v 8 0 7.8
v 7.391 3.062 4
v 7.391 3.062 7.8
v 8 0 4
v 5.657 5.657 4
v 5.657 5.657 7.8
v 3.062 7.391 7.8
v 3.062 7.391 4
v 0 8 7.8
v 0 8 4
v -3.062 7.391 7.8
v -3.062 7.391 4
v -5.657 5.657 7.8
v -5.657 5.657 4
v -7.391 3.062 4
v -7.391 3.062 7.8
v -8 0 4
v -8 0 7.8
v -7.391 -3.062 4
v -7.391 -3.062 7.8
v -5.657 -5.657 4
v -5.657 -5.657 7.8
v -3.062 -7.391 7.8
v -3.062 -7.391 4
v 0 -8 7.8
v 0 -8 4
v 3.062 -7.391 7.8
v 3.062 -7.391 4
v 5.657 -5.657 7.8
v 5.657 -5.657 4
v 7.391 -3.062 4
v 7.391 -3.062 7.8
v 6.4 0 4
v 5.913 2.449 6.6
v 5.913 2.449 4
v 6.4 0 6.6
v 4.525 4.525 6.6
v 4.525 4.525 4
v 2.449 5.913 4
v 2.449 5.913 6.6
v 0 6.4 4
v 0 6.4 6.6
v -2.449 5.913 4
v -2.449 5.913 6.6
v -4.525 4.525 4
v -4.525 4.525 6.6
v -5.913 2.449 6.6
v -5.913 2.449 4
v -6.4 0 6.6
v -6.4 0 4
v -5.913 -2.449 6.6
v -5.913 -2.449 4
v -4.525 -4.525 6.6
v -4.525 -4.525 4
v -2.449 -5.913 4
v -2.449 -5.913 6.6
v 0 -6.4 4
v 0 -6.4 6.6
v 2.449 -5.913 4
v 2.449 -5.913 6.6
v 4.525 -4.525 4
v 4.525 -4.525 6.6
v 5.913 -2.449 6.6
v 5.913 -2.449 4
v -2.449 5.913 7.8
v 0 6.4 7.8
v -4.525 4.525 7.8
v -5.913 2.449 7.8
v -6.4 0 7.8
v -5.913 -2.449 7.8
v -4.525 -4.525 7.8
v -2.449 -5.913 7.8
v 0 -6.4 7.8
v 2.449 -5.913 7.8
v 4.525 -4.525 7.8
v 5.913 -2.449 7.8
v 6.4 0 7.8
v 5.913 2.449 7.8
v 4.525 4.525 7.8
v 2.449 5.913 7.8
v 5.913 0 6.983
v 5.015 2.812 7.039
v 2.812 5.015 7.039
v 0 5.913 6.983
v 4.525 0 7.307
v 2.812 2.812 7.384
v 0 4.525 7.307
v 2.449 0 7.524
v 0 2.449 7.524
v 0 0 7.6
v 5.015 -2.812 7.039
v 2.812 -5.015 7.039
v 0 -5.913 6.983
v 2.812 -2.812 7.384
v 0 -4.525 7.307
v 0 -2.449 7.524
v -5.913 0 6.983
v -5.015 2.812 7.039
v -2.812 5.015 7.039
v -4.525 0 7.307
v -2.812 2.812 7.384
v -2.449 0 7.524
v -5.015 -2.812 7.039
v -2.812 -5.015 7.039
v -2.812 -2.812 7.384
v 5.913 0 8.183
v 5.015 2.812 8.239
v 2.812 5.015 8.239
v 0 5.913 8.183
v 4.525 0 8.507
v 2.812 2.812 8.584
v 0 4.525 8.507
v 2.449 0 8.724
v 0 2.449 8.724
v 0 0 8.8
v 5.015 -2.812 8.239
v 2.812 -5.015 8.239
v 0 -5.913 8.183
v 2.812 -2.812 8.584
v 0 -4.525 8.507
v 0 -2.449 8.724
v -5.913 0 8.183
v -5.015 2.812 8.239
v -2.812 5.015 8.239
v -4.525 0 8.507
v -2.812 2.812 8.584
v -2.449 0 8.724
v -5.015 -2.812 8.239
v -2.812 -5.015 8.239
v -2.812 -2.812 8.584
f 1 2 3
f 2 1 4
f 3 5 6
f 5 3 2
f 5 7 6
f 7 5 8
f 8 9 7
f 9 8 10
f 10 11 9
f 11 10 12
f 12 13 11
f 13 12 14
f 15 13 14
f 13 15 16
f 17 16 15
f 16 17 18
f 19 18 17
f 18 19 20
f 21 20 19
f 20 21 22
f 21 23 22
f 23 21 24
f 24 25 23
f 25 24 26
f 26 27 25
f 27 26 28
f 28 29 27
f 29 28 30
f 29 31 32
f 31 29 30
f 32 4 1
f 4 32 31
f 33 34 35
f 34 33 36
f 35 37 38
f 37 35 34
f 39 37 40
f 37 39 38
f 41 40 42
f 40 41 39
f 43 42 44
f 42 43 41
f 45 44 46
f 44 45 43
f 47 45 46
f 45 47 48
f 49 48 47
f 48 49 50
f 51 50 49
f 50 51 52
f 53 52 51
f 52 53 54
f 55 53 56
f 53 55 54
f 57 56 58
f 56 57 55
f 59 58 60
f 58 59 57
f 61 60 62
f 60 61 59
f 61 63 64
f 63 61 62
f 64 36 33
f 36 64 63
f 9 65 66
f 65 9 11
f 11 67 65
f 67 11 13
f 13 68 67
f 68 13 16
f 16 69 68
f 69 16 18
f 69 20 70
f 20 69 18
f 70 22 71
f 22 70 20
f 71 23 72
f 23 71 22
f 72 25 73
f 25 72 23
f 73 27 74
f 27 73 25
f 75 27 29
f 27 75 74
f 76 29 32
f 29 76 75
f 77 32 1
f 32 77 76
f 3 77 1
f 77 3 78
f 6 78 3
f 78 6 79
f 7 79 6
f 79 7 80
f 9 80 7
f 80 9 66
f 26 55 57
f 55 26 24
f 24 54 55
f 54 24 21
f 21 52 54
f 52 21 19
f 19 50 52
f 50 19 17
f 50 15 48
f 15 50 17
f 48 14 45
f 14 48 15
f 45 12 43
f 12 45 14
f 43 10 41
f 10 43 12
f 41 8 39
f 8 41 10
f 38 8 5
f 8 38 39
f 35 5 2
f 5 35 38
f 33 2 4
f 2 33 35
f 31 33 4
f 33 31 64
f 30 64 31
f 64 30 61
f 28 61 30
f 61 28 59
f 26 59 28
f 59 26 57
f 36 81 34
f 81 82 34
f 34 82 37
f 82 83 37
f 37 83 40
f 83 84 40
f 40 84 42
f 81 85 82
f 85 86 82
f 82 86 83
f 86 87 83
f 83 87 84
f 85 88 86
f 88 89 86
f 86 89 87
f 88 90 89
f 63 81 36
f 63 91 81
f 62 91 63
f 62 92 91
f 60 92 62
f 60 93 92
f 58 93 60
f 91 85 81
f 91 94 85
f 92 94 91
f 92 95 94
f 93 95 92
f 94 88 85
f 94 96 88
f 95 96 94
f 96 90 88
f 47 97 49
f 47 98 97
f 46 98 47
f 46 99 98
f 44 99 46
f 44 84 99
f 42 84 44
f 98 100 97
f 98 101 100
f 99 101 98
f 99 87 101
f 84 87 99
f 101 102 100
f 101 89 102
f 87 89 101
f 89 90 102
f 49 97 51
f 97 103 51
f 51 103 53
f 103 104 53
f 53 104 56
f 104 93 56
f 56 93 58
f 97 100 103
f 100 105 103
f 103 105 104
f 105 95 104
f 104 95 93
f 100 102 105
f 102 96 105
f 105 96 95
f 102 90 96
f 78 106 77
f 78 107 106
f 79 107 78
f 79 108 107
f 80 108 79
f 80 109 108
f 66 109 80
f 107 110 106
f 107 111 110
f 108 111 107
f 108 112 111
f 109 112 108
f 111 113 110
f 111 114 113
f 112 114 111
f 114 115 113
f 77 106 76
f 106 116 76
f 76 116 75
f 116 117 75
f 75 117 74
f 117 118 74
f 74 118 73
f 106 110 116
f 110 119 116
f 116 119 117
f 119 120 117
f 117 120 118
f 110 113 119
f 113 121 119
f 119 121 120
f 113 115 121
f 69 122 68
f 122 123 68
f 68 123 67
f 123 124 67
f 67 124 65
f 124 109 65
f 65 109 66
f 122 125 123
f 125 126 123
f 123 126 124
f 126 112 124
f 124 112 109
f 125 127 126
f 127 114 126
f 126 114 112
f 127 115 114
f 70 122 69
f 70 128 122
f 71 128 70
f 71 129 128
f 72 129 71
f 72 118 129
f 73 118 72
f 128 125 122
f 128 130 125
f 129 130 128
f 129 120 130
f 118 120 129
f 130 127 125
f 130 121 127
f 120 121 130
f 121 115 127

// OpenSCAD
// file: ../p/1-8sphe.scad
use <../lib.scad>
function ldraw_lib__1_8sphe() = [
// 0 Sphere 0.125
// 0 Name: 1-8sphe.dat
// 0 Author: James Jessiman
// 0 !LDRAW_ORG Primitive UPDATE 2012-03
// 0 !LICENSE Licensed under CC BY 2.0 and CC BY 4.0 : see CAreadme.txt
// 
// 0 BFC CERTIFY CCW
  [0,"BFC","CERTIFY"],
  [0,"BFC","CCW"],
// 
// 0 !HISTORY 2000-08-01 {Axel Poque} fixes to resolve L3P error messages.
// 0 !HISTORY 2000-08-01 {Manfred Moolhuysen} fixes to resolve L3P error messages.
// 0 !HISTORY 2000-09-30 [PTadmin] Official Update 2000-02
// 0 !HISTORY 2002-03-28 [hafhead] Made BFC compliant
// 0 !HISTORY 2002-04-25 [PTadmin] Official Update 2002-02
// 0 !HISTORY 2007-06-22 [PTadmin] Header formatted for Contributor Agreement
// 0 !HISTORY 2008-07-01 [PTadmin] Official Update 2008-01
// 0 !HISTORY 2010-09-12 [MagFors] Changed winding, removed duplicated cond-line, optimized filesize
// 0 !HISTORY 2010-12-31 [PTadmin] Official Update 2010-03
// 0 !HISTORY 2012-07-01 [tcobbs] Replaced with geometry from LDView
// 0 !HISTORY 2012-12-28 [PTadmin] Official Update 2012-03
// 
// 
// 3 16 1 0 0 0.9239 0.3827 0 0.9239 0 0.3827
  [3,16,1,0,0,0.9239,0.3827,0,0.9239,0,0.3827],
// 3 16 0.9239 0.3827 0 0.7836 0.4393 0.4393 0.9239 0 0.3827
  [3,16,0.9239,0.3827,0,0.7836,0.4393,0.4393,0.9239,0,0.3827],
// 3 16 0.9239 0 0.3827 0.7836 0.4393 0.4393 0.7071 0 0.7071
  [3,16,0.9239,0,0.3827,0.7836,0.4393,0.4393,0.7071,0,0.7071],
// 3 16 0.7836 0.4393 0.4393 0.4393 0.4393 0.7836 0.7071 0 0.7071
  [3,16,0.7836,0.4393,0.4393,0.4393,0.4393,0.7836,0.7071,0,0.7071],
// 3 16 0.7071 0 0.7071 0.4393 0.4393 0.7836 0.3827 0 0.9239
  [3,16,0.7071,0,0.7071,0.4393,0.4393,0.7836,0.3827,0,0.9239],
// 3 16 0.4393 0.4393 0.7836 0 0.3827 0.9239 0.3827 0 0.9239
  [3,16,0.4393,0.4393,0.7836,0,0.3827,0.9239,0.3827,0,0.9239],
// 3 16 0.3827 0 0.9239 0 0.3827 0.9239 0 0 1
  [3,16,0.3827,0,0.9239,0,0.3827,0.9239,0,0,1],
// 3 16 0.9239 0.3827 0 0.7071 0.7071 0 0.7836 0.4393 0.4393
  [3,16,0.9239,0.3827,0,0.7071,0.7071,0,0.7836,0.4393,0.4393],
// 3 16 0.7071 0.7071 0 0.4393 0.7836 0.4393 0.7836 0.4393 0.4393
  [3,16,0.7071,0.7071,0,0.4393,0.7836,0.4393,0.7836,0.4393,0.4393],
// 3 16 0.7836 0.4393 0.4393 0.4393 0.7836 0.4393 0.4393 0.4393 0.7836
  [3,16,0.7836,0.4393,0.4393,0.4393,0.7836,0.4393,0.4393,0.4393,0.7836],
// 3 16 0.4393 0.7836 0.4393 0 0.7071 0.7071 0.4393 0.4393 0.7836
  [3,16,0.4393,0.7836,0.4393,0,0.7071,0.7071,0.4393,0.4393,0.7836],
// 3 16 0.4393 0.4393 0.7836 0 0.7071 0.7071 0 0.3827 0.9239
  [3,16,0.4393,0.4393,0.7836,0,0.7071,0.7071,0,0.3827,0.9239],
// 3 16 0.7071 0.7071 0 0.3827 0.9239 0 0.4393 0.7836 0.4393
  [3,16,0.7071,0.7071,0,0.3827,0.9239,0,0.4393,0.7836,0.4393],
// 3 16 0.3827 0.9239 0 0 0.9239 0.3827 0.4393 0.7836 0.4393
  [3,16,0.3827,0.9239,0,0,0.9239,0.3827,0.4393,0.7836,0.4393],
// 3 16 0.4393 0.7836 0.4393 0 0.9239 0.3827 0 0.7071 0.7071
  [3,16,0.4393,0.7836,0.4393,0,0.9239,0.3827,0,0.7071,0.7071],
// 3 16 0.3827 0.9239 0 0 1 0 0 0.9239 0.3827
  [3,16,0.3827,0.9239,0,0,1,0,0,0.9239,0.3827],
// 
// 5 24 1 0 0 0.9239 0.3827 0 1 0 -0.1 0.9239 0 0.3827
  [5,24,1,0,0,0.9239,0.3827,0,1,0,-0.1,0.9239,0,0.3827],
// 5 24 0.9239 0.3827 0 0.9239 0 0.3827 1 0 0 0.7836 0.4393 0.4393
  [5,24,0.9239,0.3827,0,0.9239,0,0.3827,1,0,0,0.7836,0.4393,0.4393],
// 5 24 1 0 0 0.9239 0 0.3827 0.9239 0.3827 0 1 -0.1 0
  [5,24,1,0,0,0.9239,0,0.3827,0.9239,0.3827,0,1,-0.1,0],
// 5 24 0.9239 0 0.3827 0.7836 0.4393 0.4393 0.9239 0.3827 0 0.7071 0 0.7071
  [5,24,0.9239,0,0.3827,0.7836,0.4393,0.4393,0.9239,0.3827,0,0.7071,0,0.7071],
// 5 24 0.7836 0.4393 0.4393 0.7071 0 0.7071 0.9239 0 0.3827 0.4393 0.4393 0.7836
  [5,24,0.7836,0.4393,0.4393,0.7071,0,0.7071,0.9239,0,0.3827,0.4393,0.4393,0.7836],
// 5 24 0.9239 0 0.3827 0.7071 0 0.7071 0.7836 0.4393 0.4393 0.9239 -0.1 0.3827
  [5,24,0.9239,0,0.3827,0.7071,0,0.7071,0.7836,0.4393,0.4393,0.9239,-0.1,0.3827],
// 5 24 0.7071 0 0.7071 0.4393 0.4393 0.7836 0.7836 0.4393 0.4393 0.3827 0 0.9239
  [5,24,0.7071,0,0.7071,0.4393,0.4393,0.7836,0.7836,0.4393,0.4393,0.3827,0,0.9239],
// 5 24 0.4393 0.4393 0.7836 0.3827 0 0.9239 0.7071 0 0.7071 0 0.3827 0.9239
  [5,24,0.4393,0.4393,0.7836,0.3827,0,0.9239,0.7071,0,0.7071,0,0.3827,0.9239],
// 5 24 0.7071 0 0.7071 0.3827 0 0.9239 0.4393 0.4393 0.7836 0.7071 -0.1 0.7071
  [5,24,0.7071,0,0.7071,0.3827,0,0.9239,0.4393,0.4393,0.7836,0.7071,-0.1,0.7071],
// 5 24 0.3827 0 0.9239 0 0.3827 0.9239 0.4393 0.4393 0.7836 0 0 1
  [5,24,0.3827,0,0.9239,0,0.3827,0.9239,0.4393,0.4393,0.7836,0,0,1],
// 5 24 0 0.3827 0.9239 0 0 1 0.3827 0 0.9239 -0.1 0.3827 0.9239
  [5,24,0,0.3827,0.9239,0,0,1,0.3827,0,0.9239,-0.1,0.3827,0.9239],
// 5 24 0.3827 0 0.9239 0 0 1 0 0.3827 0.9239 0.3827 -0.1 0.9239
  [5,24,0.3827,0,0.9239,0,0,1,0,0.3827,0.9239,0.3827,-0.1,0.9239],
// 5 24 0.9239 0.3827 0 0.7071 0.7071 0 0.9239 0.3827 -0.1 0.7836 0.4393 0.4393
  [5,24,0.9239,0.3827,0,0.7071,0.7071,0,0.9239,0.3827,-0.1,0.7836,0.4393,0.4393],
// 5 24 0.7071 0.7071 0 0.7836 0.4393 0.4393 0.9239 0.3827 0 0.4393 0.7836 0.4393
  [5,24,0.7071,0.7071,0,0.7836,0.4393,0.4393,0.9239,0.3827,0,0.4393,0.7836,0.4393],
// 5 24 0.9239 0.3827 0 0.7836 0.4393 0.4393 0.7071 0.7071 0 0.9239 0 0.3827
  [5,24,0.9239,0.3827,0,0.7836,0.4393,0.4393,0.7071,0.7071,0,0.9239,0,0.3827],
// 5 24 0.7836 0.4393 0.4393 0.4393 0.7836 0.4393 0.7071 0.7071 0 0.4393 0.4393 0.7836
  [5,24,0.7836,0.4393,0.4393,0.4393,0.7836,0.4393,0.7071,0.7071,0,0.4393,0.4393,0.7836],
// 5 24 0.4393 0.7836 0.4393 0.4393 0.4393 0.7836 0.7836 0.4393 0.4393 0 0.7071 0.7071
  [5,24,0.4393,0.7836,0.4393,0.4393,0.4393,0.7836,0.7836,0.4393,0.4393,0,0.7071,0.7071],
// 5 24 0.7836 0.4393 0.4393 0.4393 0.4393 0.7836 0.4393 0.7836 0.4393 0.7071 0 0.7071
  [5,24,0.7836,0.4393,0.4393,0.4393,0.4393,0.7836,0.4393,0.7836,0.4393,0.7071,0,0.7071],
// 5 24 0.4393 0.4393 0.7836 0 0.7071 0.7071 0.4393 0.7836 0.4393 0 0.3827 0.9239
  [5,24,0.4393,0.4393,0.7836,0,0.7071,0.7071,0.4393,0.7836,0.4393,0,0.3827,0.9239],
// 5 24 0 0.7071 0.7071 0 0.3827 0.9239 0.4393 0.4393 0.7836 -0.1 0.7071 0.7071
  [5,24,0,0.7071,0.7071,0,0.3827,0.9239,0.4393,0.4393,0.7836,-0.1,0.7071,0.7071],
// 5 24 0.4393 0.4393 0.7836 0 0.3827 0.9239 0 0.7071 0.7071 0.3827 0 0.9239
  [5,24,0.4393,0.4393,0.7836,0,0.3827,0.9239,0,0.7071,0.7071,0.3827,0,0.9239],
// 5 24 0.7071 0.7071 0 0.3827 0.9239 0 0.7071 0.7071 -0.1 0.4393 0.7836 0.4393
  [5,24,0.7071,0.7071,0,0.3827,0.9239,0,0.7071,0.7071,-0.1,0.4393,0.7836,0.4393],
// 5 24 0.3827 0.9239 0 0.4393 0.7836 0.4393 0.7071 0.7071 0 0 0.9239 0.3827
  [5,24,0.3827,0.9239,0,0.4393,0.7836,0.4393,0.7071,0.7071,0,0,0.9239,0.3827],
// 5 24 0.7071 0.7071 0 0.4393 0.7836 0.4393 0.3827 0.9239 0 0.7836 0.4393 0.4393
  [5,24,0.7071,0.7071,0,0.4393,0.7836,0.4393,0.3827,0.9239,0,0.7836,0.4393,0.4393],
// 5 24 0.4393 0.7836 0.4393 0 0.9239 0.3827 0.3827 0.9239 0 0 0.7071 0.7071
  [5,24,0.4393,0.7836,0.4393,0,0.9239,0.3827,0.3827,0.9239,0,0,0.7071,0.7071],
// 5 24 0 0.9239 0.3827 0 0.7071 0.7071 0.4393 0.7836 0.4393 -0.1 0.9239 0.3827
  [5,24,0,0.9239,0.3827,0,0.7071,0.7071,0.4393,0.7836,0.4393,-0.1,0.9239,0.3827],
// 5 24 0.4393 0.7836 0.4393 0 0.7071 0.7071 0 0.9239 0.3827 0.4393 0.4393 0.7836
  [5,24,0.4393,0.7836,0.4393,0,0.7071,0.7071,0,0.9239,0.3827,0.4393,0.4393,0.7836],
// 5 24 0.3827 0.9239 0 0 1 0 0.3827 0.9239 -0.1 0 0.9239 0.3827
  [5,24,0.3827,0.9239,0,0,1,0,0.3827,0.9239,-0.1,0,0.9239,0.3827],
// 5 24 0 1 0 0 0.9239 0.3827 0.3827 0.9239 0 -0.1 1 0
  [5,24,0,1,0,0,0.9239,0.3827,0.3827,0.9239,0,-0.1,1,0],
// 5 24 0.3827 0.9239 0 0 0.9239 0.3827 0 1 0 0.4393 0.7836 0.4393
  [5,24,0.3827,0.9239,0,0,0.9239,0.3827,0,1,0,0.4393,0.7836,0.4393],
];
module ldraw_lib__1_8sphe(step=0, col=false, unit=2/5, alt=false, line=0.2, solid=!$preview)
    makepoly(ldraw_lib__1_8sphe(), step=step, col=col, unit=unit, alt=alt, line=line, solid=solid);
ldraw_lib__1_8sphe(line=0.2);
// file: ../p/4-4cyli.scad
use <../lib.scad>
function ldraw_lib__4_4cyli() = [
// 0 Cylinder 1.0
// 0 Name: 4-4cyli.dat
// 0 Author: James Jessiman
// 0 !LDRAW_ORG Primitive UPDATE 2005-01
// 0 !LICENSE Licensed under CC BY 2.0 and CC BY 4.0 : see CAreadme.txt
// 
// 0 BFC CERTIFY CCW
  [0,"BFC","CERTIFY"],
  [0,"BFC","CCW"],
// 
// 0 !HISTORY 1998-12-15 [PTadmin] Official Update 1998-10
// 0 !HISTORY 2002-03-23 [sbliss] Added BFC statement; merged headers from files in distributions LDraw 0.27 and Complete.
// 0 !HISTORY 2002-04-25 [PTadmin] Official Update 2002-02
// 0 !HISTORY 2004-12-14 [guyvivan] BFC CCW
// 0 !HISTORY 2005-12-28 [PTadmin] Official Update 2005-01
// 0 !HISTORY 2007-06-24 [PTadmin] Header formatted for Contributor Agreement
// 0 !HISTORY 2008-07-01 [PTadmin] Official Update 2008-01
// 
// 
// 4 16 1 1 0 0.9239 1 0.3827 0.9239 0 0.3827 1 0 0
  [4,16,1,1,0,0.9239,1,0.3827,0.9239,0,0.3827,1,0,0],
// 5 24 1 0 0 1 1 0 0.9239 0 0.3827 0.9239 0 -0.3827
  [5,24,1,0,0,1,1,0,0.9239,0,0.3827,0.9239,0,-0.3827],
// 4 16 0.9239 1 0.3827 0.7071 1 0.7071 0.7071 0 0.7071 0.9239 0 0.3827
  [4,16,0.9239,1,0.3827,0.7071,1,0.7071,0.7071,0,0.7071,0.9239,0,0.3827],
// 5 24 0.9239 0 0.3827 0.9239 1 0.3827 0.7071 0 0.7071 1 0 0
  [5,24,0.9239,0,0.3827,0.9239,1,0.3827,0.7071,0,0.7071,1,0,0],
// 4 16 0.7071 1 0.7071 0.3827 1 0.9239 0.3827 0 0.9239 0.7071 0 0.7071
  [4,16,0.7071,1,0.7071,0.3827,1,0.9239,0.3827,0,0.9239,0.7071,0,0.7071],
// 5 24 0.7071 0 0.7071 0.7071 1 0.7071 0.3827 0 0.9239 0.9239 0 0.3827
  [5,24,0.7071,0,0.7071,0.7071,1,0.7071,0.3827,0,0.9239,0.9239,0,0.3827],
// 4 16 0.3827 1 0.9239 0 1 1 0 0 1 0.3827 0 0.9239
  [4,16,0.3827,1,0.9239,0,1,1,0,0,1,0.3827,0,0.9239],
// 5 24 0.3827 0 0.9239 0.3827 1 0.9239 0 0 1 0.7071 0 0.7071
  [5,24,0.3827,0,0.9239,0.3827,1,0.9239,0,0,1,0.7071,0,0.7071],
// 4 16 0 1 1 -0.3827 1 0.9239 -0.3827 0 0.9239 0 0 1
  [4,16,0,1,1,-0.3827,1,0.9239,-0.3827,0,0.9239,0,0,1],
// 5 24 0 0 1 0 1 1 -0.3827 0 0.9239 0.3827 0 0.9239
  [5,24,0,0,1,0,1,1,-0.3827,0,0.9239,0.3827,0,0.9239],
// 4 16 -0.3827 1 0.9239 -0.7071 1 0.7071 -0.7071 0 0.7071 -0.3827 0 0.9239
  [4,16,-0.3827,1,0.9239,-0.7071,1,0.7071,-0.7071,0,0.7071,-0.3827,0,0.9239],
// 5 24 -0.3827 0 0.9239 -0.3827 1 0.9239 -0.7071 0 0.7071 0 0 1
  [5,24,-0.3827,0,0.9239,-0.3827,1,0.9239,-0.7071,0,0.7071,0,0,1],
// 4 16 -0.7071 1 0.7071 -0.9239 1 0.3827 -0.9239 0 0.3827 -0.7071 0 0.7071
  [4,16,-0.7071,1,0.7071,-0.9239,1,0.3827,-0.9239,0,0.3827,-0.7071,0,0.7071],
// 5 24 -0.7071 0 0.7071 -0.7071 1 0.7071 -0.9239 0 0.3827 -0.3827 0 0.9239
  [5,24,-0.7071,0,0.7071,-0.7071,1,0.7071,-0.9239,0,0.3827,-0.3827,0,0.9239],
// 4 16 -0.9239 1 0.3827 -1 1 0 -1 0 0 -0.9239 0 0.3827
  [4,16,-0.9239,1,0.3827,-1,1,0,-1,0,0,-0.9239,0,0.3827],
// 5 24 -0.9239 0 0.3827 -0.9239 1 0.3827 -1 0 0 -0.7071 0 0.7071
  [5,24,-0.9239,0,0.3827,-0.9239,1,0.3827,-1,0,0,-0.7071,0,0.7071],
// 4 16 -1 1 0 -0.9239 1 -0.3827 -0.9239 0 -0.3827 -1 0 0
  [4,16,-1,1,0,-0.9239,1,-0.3827,-0.9239,0,-0.3827,-1,0,0],
// 5 24 -1 0 0 -1 1 0 -0.9239 0 -0.3827 -0.9239 0 0.3827
  [5,24,-1,0,0,-1,1,0,-0.9239,0,-0.3827,-0.9239,0,0.3827],
// 4 16 -0.9239 1 -0.3827 -0.7071 1 -0.7071 -0.7071 0 -0.7071 -0.9239 0 -0.3827
  [4,16,-0.9239,1,-0.3827,-0.7071,1,-0.7071,-0.7071,0,-0.7071,-0.9239,0,-0.3827],
// 5 24 -0.9239 0 -0.3827 -0.9239 1 -0.3827 -0.7071 0 -0.7071 -1 0 0
  [5,24,-0.9239,0,-0.3827,-0.9239,1,-0.3827,-0.7071,0,-0.7071,-1,0,0],
// 4 16 -0.7071 1 -0.7071 -0.3827 1 -0.9239 -0.3827 0 -0.9239 -0.7071 0 -0.7071
  [4,16,-0.7071,1,-0.7071,-0.3827,1,-0.9239,-0.3827,0,-0.9239,-0.7071,0,-0.7071],
// 5 24 -0.7071 0 -0.7071 -0.7071 1 -0.7071 -0.3827 0 -0.9239 -0.9239 0 -0.3827
  [5,24,-0.7071,0,-0.7071,-0.7071,1,-0.7071,-0.3827,0,-0.9239,-0.9239,0,-0.3827],
// 4 16 -0.3827 1 -0.9239 0 1 -1 0 0 -1 -0.3827 0 -0.9239
  [4,16,-0.3827,1,-0.9239,0,1,-1,0,0,-1,-0.3827,0,-0.9239],
// 5 24 -0.3827 0 -0.9239 -0.3827 1 -0.9239 0 0 -1 -0.7071 0 -0.7071
  [5,24,-0.3827,0,-0.9239,-0.3827,1,-0.9239,0,0,-1,-0.7071,0,-0.7071],
// 4 16 0 1 -1 0.3827 1 -0.9239 0.3827 0 -0.9239 0 0 -1
  [4,16,0,1,-1,0.3827,1,-0.9239,0.3827,0,-0.9239,0,0,-1],
// 5 24 0 0 -1 0 1 -1 0.3827 0 -0.9239 -0.3827 0 -0.9239
  [5,24,0,0,-1,0,1,-1,0.3827,0,-0.9239,-0.3827,0,-0.9239],
// 4 16 0.3827 1 -0.9239 0.7071 1 -0.7071 0.7071 0 -0.7071 0.3827 0 -0.9239
  [4,16,0.3827,1,-0.9239,0.7071,1,-0.7071,0.7071,0,-0.7071,0.3827,0,-0.9239],
// 5 24 0.3827 0 -0.9239 0.3827 1 -0.9239 0.7071 0 -0.7071 0 0 -1
  [5,24,0.3827,0,-0.9239,0.3827,1,-0.9239,0.7071,0,-0.7071,0,0,-1],
// 4 16 0.7071 1 -0.7071 0.9239 1 -0.3827 0.9239 0 -0.3827 0.7071 0 -0.7071
  [4,16,0.7071,1,-0.7071,0.9239,1,-0.3827,0.9239,0,-0.3827,0.7071,0,-0.7071],
// 5 24 0.7071 0 -0.7071 0.7071 1 -0.7071 0.9239 0 -0.3827 0.3827 0 -0.9239
  [5,24,0.7071,0,-0.7071,0.7071,1,-0.7071,0.9239,0,-0.3827,0.3827,0,-0.9239],
// 4 16 0.9239 1 -0.3827 1 1 0 1 0 0 0.9239 0 -0.3827
  [4,16,0.9239,1,-0.3827,1,1,0,1,0,0,0.9239,0,-0.3827],
// 5 24 0.9239 0 -0.3827 0.9239 1 -0.3827 1 0 0 0.7071 0 -0.7071
  [5,24,0.9239,0,-0.3827,0.9239,1,-0.3827,1,0,0,0.7071,0,-0.7071],
// 0
];
module ldraw_lib__4_4cyli(step=0, col=false, unit=2/5, alt=false, line=0.2, solid=!$preview)
    makepoly(ldraw_lib__4_4cyli(), step=step, col=col, unit=unit, alt=alt, line=line, solid=solid);
ldraw_lib__4_4cyli(line=0.2);
// file: ../p/4-8sphe.scad
use <../lib.scad>
use <1-8sphe.scad>
function ldraw_lib__4_8sphe() = [
// 0 Sphere 0.5
// 0 Name: 4-8sphe.dat
// 0 Author: James Jessiman
// 0 !LDRAW_ORG Primitive UPDATE 2003-02
// 0 !LICENSE Licensed under CC BY 2.0 and CC BY 4.0 : see CAreadme.txt
// 
// 0 BFC CERTIFY CCW
  [0,"BFC","CERTIFY"],
  [0,"BFC","CCW"],
// 
// 0 !HISTORY 2002-08-31 [izanette] Modified with WINDZ for BFC compliance
// 0 !HISTORY 2003-08-01 [PTadmin] Official Update 2003-02
// 0 !HISTORY 2007-06-24 [PTadmin] Header formatted for Contributor Agreement
// 0 !HISTORY 2008-07-01 [PTadmin] Official Update 2008-01
// 
// 
// 1 16 0 0 0 1 0 0 0 1 0 0 0 1 1-8sphe.dat
  [1,16,0,0,0,1,0,0,0,1,0,0,0,1, ldraw_lib__1_8sphe()],
// 1 16 0 0 0 1 0 0 0 1 0 0 0 -1 1-8sphe.dat
  [1,16,0,0,0,1,0,0,0,1,0,0,0,-1, ldraw_lib__1_8sphe()],
// 1 16 0 0 0 -1 0 0 0 1 0 0 0 1 1-8sphe.dat
  [1,16,0,0,0,-1,0,0,0,1,0,0,0,1, ldraw_lib__1_8sphe()],
// 1 16 0 0 0 -1 0 0 0 1 0 0 0 -1 1-8sphe.dat
  [1,16,0,0,0,-1,0,0,0,1,0,0,0,-1, ldraw_lib__1_8sphe()],
// 0
// 
];
module ldraw_lib__4_8sphe(step=0, col=false, unit=2/5, alt=false, line=0.2, solid=!$preview)
    makepoly(ldraw_lib__4_8sphe(), step=step, col=col, unit=unit, alt=alt, line=line, solid=solid);
ldraw_lib__4_8sphe(line=0.2);
// file: ../p/4-4ring4.scad
use <../lib.scad>
function ldraw_lib__4_4ring4() = [
// 0 Ring  4 x 1.0
// 0 Name: 4-4ring4.dat
// 0 Author: James Jessiman
// 0 !LDRAW_ORG Primitive UPDATE 2009-01
// 0 !LICENSE Licensed under CC BY 2.0 and CC BY 4.0 : see CAreadme.txt
// 
// 0 BFC CERTIFY CCW
  [0,"BFC","CERTIFY"],
  [0,"BFC","CCW"],
// 
// 0 !HISTORY 1998-12-15 [PTadmin] Official Update 1998-10
// 0 !HISTORY 2002-04-08 [BrickCaster] Modified for BFC compliance
// 0 !HISTORY 2002-04-25 [PTadmin] Official Update 2002-02
// 0 !HISTORY 2007-06-24 [PTadmin] Header formatted for Contributor Agreement
// 0 !HISTORY 2008-07-01 [PTadmin] Official Update 2008-01
// 0 !HISTORY 2008-08-26 [cwdee] Switch polygon winding and rename
// 0 !HISTORY 2009-05-02 [PTadmin] Official Update 2009-01
// 
// 
// 4 16 -1.9135 0 4.6195 -1.5308 0 3.6956 0 0 4 0 0 5
  [4,16,-1.9135,0,4.6195,-1.5308,0,3.6956,0,0,4,0,0,5],
// 4 16 -3.5355 0 3.5355 -2.8284 0 2.8284 -1.5308 0 3.6956 -1.9135 0 4.6195
  [4,16,-3.5355,0,3.5355,-2.8284,0,2.8284,-1.5308,0,3.6956,-1.9135,0,4.6195],
// 4 16 -4.6195 0 1.9135 -3.6956 0 1.5308 -2.8284 0 2.8284 -3.5355 0 3.5355
  [4,16,-4.6195,0,1.9135,-3.6956,0,1.5308,-2.8284,0,2.8284,-3.5355,0,3.5355],
// 4 16 -5 0 0 -4 0 0 -3.6956 0 1.5308 -4.6195 0 1.9135
  [4,16,-5,0,0,-4,0,0,-3.6956,0,1.5308,-4.6195,0,1.9135],
// 4 16 -4.6195 0 -1.9135 -3.6956 0 -1.5308 -4 0 0 -5 0 0
  [4,16,-4.6195,0,-1.9135,-3.6956,0,-1.5308,-4,0,0,-5,0,0],
// 4 16 -3.5355 0 -3.5355 -2.8284 0 -2.8284 -3.6956 0 -1.5308 -4.6195 0 -1.9135
  [4,16,-3.5355,0,-3.5355,-2.8284,0,-2.8284,-3.6956,0,-1.5308,-4.6195,0,-1.9135],
// 4 16 -1.9135 0 -4.6195 -1.5308 0 -3.6956 -2.8284 0 -2.8284 -3.5355 0 -3.5355
  [4,16,-1.9135,0,-4.6195,-1.5308,0,-3.6956,-2.8284,0,-2.8284,-3.5355,0,-3.5355],
// 4 16 0 0 -5 0 0 -4 -1.5308 0 -3.6956 -1.9135 0 -4.6195
  [4,16,0,0,-5,0,0,-4,-1.5308,0,-3.6956,-1.9135,0,-4.6195],
// 4 16 1.9135 0 -4.6195 1.5308 0 -3.6956 0 0 -4 0 0 -5
  [4,16,1.9135,0,-4.6195,1.5308,0,-3.6956,0,0,-4,0,0,-5],
// 4 16 3.5355 0 -3.5355 2.8284 0 -2.8284 1.5308 0 -3.6956 1.9135 0 -4.6195
  [4,16,3.5355,0,-3.5355,2.8284,0,-2.8284,1.5308,0,-3.6956,1.9135,0,-4.6195],
// 4 16 4.6195 0 -1.9135 3.6956 0 -1.5308 2.8284 0 -2.8284 3.5355 0 -3.5355
  [4,16,4.6195,0,-1.9135,3.6956,0,-1.5308,2.8284,0,-2.8284,3.5355,0,-3.5355],
// 4 16 5 0 0 4 0 0 3.6956 0 -1.5308 4.6195 0 -1.9135
  [4,16,5,0,0,4,0,0,3.6956,0,-1.5308,4.6195,0,-1.9135],
// 4 16 4.6195 0 1.9135 3.6956 0 1.5308 4 0 0 5 0 0
  [4,16,4.6195,0,1.9135,3.6956,0,1.5308,4,0,0,5,0,0],
// 4 16 3.5355 0 3.5355 2.8284 0 2.8284 3.6956 0 1.5308 4.6195 0 1.9135
  [4,16,3.5355,0,3.5355,2.8284,0,2.8284,3.6956,0,1.5308,4.6195,0,1.9135],
// 4 16 1.9135 0 4.6195 1.5308 0 3.6956 2.8284 0 2.8284 3.5355 0 3.5355
  [4,16,1.9135,0,4.6195,1.5308,0,3.6956,2.8284,0,2.8284,3.5355,0,3.5355],
// 4 16 0 0 5 0 0 4 1.5308 0 3.6956 1.9135 0 4.6195
  [4,16,0,0,5,0,0,4,1.5308,0,3.6956,1.9135,0,4.6195],
// 0
];
module ldraw_lib__4_4ring4(step=0, col=false, unit=2/5, alt=false, line=0.2, solid=!$preview)
    makepoly(ldraw_lib__4_4ring4(), step=step, col=col, unit=unit, alt=alt, line=line, solid=solid);
ldraw_lib__4_4ring4(line=0.2);
// file: ../p/4-4edge.scad
use <../lib.scad>
function ldraw_lib__4_4edge() = [
// 0 Circle 1.0
// 0 Name: 4-4edge.dat
// 0 Author: James Jessiman
// 0 !LDRAW_ORG Primitive UPDATE 2017-01
// 0 !LICENSE Licensed under CC BY 4.0 : see CAreadme.txt
// 
// 0 BFC CERTIFY CCW
  [0,"BFC","CERTIFY"],
  [0,"BFC","CCW"],
// 
// 0 !HISTORY 1998-12-15 [PTadmin] Official Update 1998-10
// 0 !HISTORY 2005-12-28 [PTadmin] Official Update 2005-01
// 0 !HISTORY 2007-06-24 [PTadmin] Header formatted for Contributor Agreement
// 0 !HISTORY 2008-07-01 [PTadmin] Official Update 2008-01
// 0 !HISTORY 2017-01-15 [Steffen] BFCed
// 0 !HISTORY 2017-12-30 [PTadmin] Official Update 2017-01
// 
// 
// 2 24 1 0 0 0.9239 0 0.3827
  [2,24,1,0,0,0.9239,0,0.3827],
// 2 24 0.9239 0 0.3827 0.7071 0 0.7071
  [2,24,0.9239,0,0.3827,0.7071,0,0.7071],
// 2 24 0.7071 0 0.7071 0.3827 0 0.9239
  [2,24,0.7071,0,0.7071,0.3827,0,0.9239],
// 2 24 0.3827 0 0.9239 0 0 1
  [2,24,0.3827,0,0.9239,0,0,1],
// 2 24 0 0 1 -0.3827 0 0.9239
  [2,24,0,0,1,-0.3827,0,0.9239],
// 2 24 -0.3827 0 0.9239 -0.7071 0 0.7071
  [2,24,-0.3827,0,0.9239,-0.7071,0,0.7071],
// 2 24 -0.7071 0 0.7071 -0.9239 0 0.3827
  [2,24,-0.7071,0,0.7071,-0.9239,0,0.3827],
// 2 24 -0.9239 0 0.3827 -1 0 -0
  [2,24,-0.9239,0,0.3827,-1,0,-0],
// 2 24 -1 0 -0 -0.9239 0 -0.3827
  [2,24,-1,0,-0,-0.9239,0,-0.3827],
// 2 24 -0.9239 0 -0.3827 -0.7071 0 -0.7071
  [2,24,-0.9239,0,-0.3827,-0.7071,0,-0.7071],
// 2 24 -0.7071 0 -0.7071 -0.3827 0 -0.9239
  [2,24,-0.7071,0,-0.7071,-0.3827,0,-0.9239],
// 2 24 -0.3827 0 -0.9239 0 0 -1
  [2,24,-0.3827,0,-0.9239,0,0,-1],
// 2 24 0 0 -1 0.3827 0 -0.9239
  [2,24,0,0,-1,0.3827,0,-0.9239],
// 2 24 0.3827 0 -0.9239 0.7071 0 -0.7071
  [2,24,0.3827,0,-0.9239,0.7071,0,-0.7071],
// 2 24 0.7071 0 -0.7071 0.9239 0 -0.3827
  [2,24,0.7071,0,-0.7071,0.9239,0,-0.3827],
// 2 24 0.9239 0 -0.3827 1 0 0
  [2,24,0.9239,0,-0.3827,1,0,0],
];
module ldraw_lib__4_4edge(step=0, col=false, unit=2/5, alt=false, line=0.2, solid=!$preview)
    makepoly(ldraw_lib__4_4edge(), step=step, col=col, unit=unit, alt=alt, line=line, solid=solid);
ldraw_lib__4_4edge(line=0.2);
// file: ../p/4-4cylo.scad
use <../lib.scad>
use <4-4cyli.scad>
use <4-4edge.scad>
function ldraw_lib__4_4cylo() = [
// 0 Cylinder Open 1.0
// 0 Name: 4-4cylo.dat
// 0 Author: Mark Kennedy [mkennedy]
// 0 !LDRAW_ORG Primitive UPDATE 2010-01
// 0 !LICENSE Licensed under CC BY 4.0 : see CAreadme.txt
// 
// 0 BFC CERTIFY CCW
  [0,"BFC","CERTIFY"],
  [0,"BFC","CCW"],
// 
// 0 !HISTORY 2010-04-05 [PTadmin] Official Update 2010-01
// 
// 
// 1 16 0 0 0 1 0 0 0 1 0 0 0 1 4-4edge.dat
  [1,16,0,0,0,1,0,0,0,1,0,0,0,1, ldraw_lib__4_4edge()],
// 1 16 0 1 0 1 0 0 0 1 0 0 0 1 4-4edge.dat
  [1,16,0,1,0,1,0,0,0,1,0,0,0,1, ldraw_lib__4_4edge()],
// 1 16 0 0 0 1 0 0 0 1 0 0 0 1 4-4cyli.dat
  [1,16,0,0,0,1,0,0,0,1,0,0,0,1, ldraw_lib__4_4cyli()],
// 0
];
module ldraw_lib__4_4cylo(step=0, col=false, unit=2/5, alt=false, line=0.2, solid=!$preview)
    makepoly(ldraw_lib__4_4cylo(), step=step, col=col, unit=unit, alt=alt, line=line, solid=solid);
ldraw_lib__4_4cylo(line=0.2);
// file: 6095.scad
use <../lib.scad>
use <../p/4-4cylo.scad>
use <../p/4-4edge.scad>
use <../p/4-4ring4.scad>
use <../p/4-8sphe.scad>
function ldraw_lib__6095() = [
// 0 ~Minifig Compass Cover
// 0 Name: 6095.dat
// 0 Author: Michael Heidemann [mikeheide]
// 0 !LDRAW_ORG Part UPDATE 2020-01
// 0 !LICENSE Licensed under CC BY 4.0 : see CAreadme.txt
// 
// 0 BFC CERTIFY CCW
  [0,"BFC","CERTIFY"],
  [0,"BFC","CCW"],
// 
// 0 !HISTORY 2009-12-29 [PTadmin] Official Update 2009-03
// 0 !HISTORY 2018-06-02 [MagFors] Renamed from 888
// 0 !HISTORY 2020-06-28 [PTadmin] Official Update 2020-01
// 
// 
// 1 16 0 -10 0 20 0 0 0 -9.5 0 0 0 20 4-4cylo.dat
  [1,16,0,-10,0,20,0,0,0,-9.5,0,0,0,20, ldraw_lib__4_4cylo()],
// 0 BFC INVERTNEXT
  [0,"BFC","INVERTNEXT"],
// 1 16 0 -10 0 16 0 0 0 -6.5 0 0 0 16 4-4cylo.dat
  [1,16,0,-10,0,16,0,0,0,-6.5,0,0,0,16, ldraw_lib__4_4cylo()],
// 1 16 0 -19.5 0 4 0 0 0 1 0 0 0 4 4-4ring4.dat
  [1,16,0,-19.5,0,4,0,0,0,1,0,0,0,4, ldraw_lib__4_4ring4()],
// 1 16 0 -10 0 4 0 0 0 -1 0 0 0 -4 4-4ring4.dat
  [1,16,0,-10,0,4,0,0,0,-1,0,0,0,-4, ldraw_lib__4_4ring4()],
// 0 BFC INVERTNEXT
  [0,"BFC","INVERTNEXT"],
// 1 16 0 -16.5 0 16 0 0 0 -2.5 0 0 0 16 4-8sphe.dat
  [1,16,0,-16.5,0,16,0,0,0,-2.5,0,0,0,16, ldraw_lib__4_8sphe()],
// 1 16 0 -19.5 0 16 0 0 0 1 0 0 0 16 4-4edge.dat
  [1,16,0,-19.5,0,16,0,0,0,1,0,0,0,16, ldraw_lib__4_4edge()],
// 1 16 0 -19.5 0 16 0 0 0 -2.5 0 0 0 16 4-8sphe.dat
  [1,16,0,-19.5,0,16,0,0,0,-2.5,0,0,0,16, ldraw_lib__4_8sphe()],
];
module ldraw_lib__6095(step=0, col=false, unit=2/5, alt=false, line=0.2, solid=!$preview)
    makepoly(ldraw_lib__6095(), step=step, col=col, unit=unit, alt=alt, line=line, solid=solid);
ldraw_lib__6095(line=0.2);
// main file
use <../lib.scad>
use <6095.scad>
function ldraw_lib__888() = [
// 0 ~Moved to 6095
// 0 Name: 888.dat
// 0 Author: [PTadmin]
// 0 !LDRAW_ORG Part UPDATE 2020-01
// 0 !LICENSE Licensed under CC BY 4.0 : see CAreadme.txt
// 
// 0 BFC CERTIFY CCW
  [0,"BFC","CERTIFY"],
  [0,"BFC","CCW"],
// 
// 0 !HISTORY 2009-12-29 [PTadmin] Official Update 2009-03
// 0 !HISTORY 2018-06-04 [MagFors] Moved to 6095
// 0 !HISTORY 2020-06-28 [PTadmin] Official Update 2020-01
// 
// 
// 0 // Minifig Compass Cover
// 1 16 0 0 0 1 0 0 0 1 0 0 0 1 6095.dat
  [1,16,0,0,0,1,0,0,0,1,0,0,0,1, ldraw_lib__6095()],
];
module ldraw_lib__888(step=0, col=false, unit=2/5, alt=false, line=0.2, solid=!$preview)
    makepoly(ldraw_lib__888(), step=step, col=col, unit=unit, alt=alt, line=line, solid=solid);
ldraw_lib__888(line=0.2);
